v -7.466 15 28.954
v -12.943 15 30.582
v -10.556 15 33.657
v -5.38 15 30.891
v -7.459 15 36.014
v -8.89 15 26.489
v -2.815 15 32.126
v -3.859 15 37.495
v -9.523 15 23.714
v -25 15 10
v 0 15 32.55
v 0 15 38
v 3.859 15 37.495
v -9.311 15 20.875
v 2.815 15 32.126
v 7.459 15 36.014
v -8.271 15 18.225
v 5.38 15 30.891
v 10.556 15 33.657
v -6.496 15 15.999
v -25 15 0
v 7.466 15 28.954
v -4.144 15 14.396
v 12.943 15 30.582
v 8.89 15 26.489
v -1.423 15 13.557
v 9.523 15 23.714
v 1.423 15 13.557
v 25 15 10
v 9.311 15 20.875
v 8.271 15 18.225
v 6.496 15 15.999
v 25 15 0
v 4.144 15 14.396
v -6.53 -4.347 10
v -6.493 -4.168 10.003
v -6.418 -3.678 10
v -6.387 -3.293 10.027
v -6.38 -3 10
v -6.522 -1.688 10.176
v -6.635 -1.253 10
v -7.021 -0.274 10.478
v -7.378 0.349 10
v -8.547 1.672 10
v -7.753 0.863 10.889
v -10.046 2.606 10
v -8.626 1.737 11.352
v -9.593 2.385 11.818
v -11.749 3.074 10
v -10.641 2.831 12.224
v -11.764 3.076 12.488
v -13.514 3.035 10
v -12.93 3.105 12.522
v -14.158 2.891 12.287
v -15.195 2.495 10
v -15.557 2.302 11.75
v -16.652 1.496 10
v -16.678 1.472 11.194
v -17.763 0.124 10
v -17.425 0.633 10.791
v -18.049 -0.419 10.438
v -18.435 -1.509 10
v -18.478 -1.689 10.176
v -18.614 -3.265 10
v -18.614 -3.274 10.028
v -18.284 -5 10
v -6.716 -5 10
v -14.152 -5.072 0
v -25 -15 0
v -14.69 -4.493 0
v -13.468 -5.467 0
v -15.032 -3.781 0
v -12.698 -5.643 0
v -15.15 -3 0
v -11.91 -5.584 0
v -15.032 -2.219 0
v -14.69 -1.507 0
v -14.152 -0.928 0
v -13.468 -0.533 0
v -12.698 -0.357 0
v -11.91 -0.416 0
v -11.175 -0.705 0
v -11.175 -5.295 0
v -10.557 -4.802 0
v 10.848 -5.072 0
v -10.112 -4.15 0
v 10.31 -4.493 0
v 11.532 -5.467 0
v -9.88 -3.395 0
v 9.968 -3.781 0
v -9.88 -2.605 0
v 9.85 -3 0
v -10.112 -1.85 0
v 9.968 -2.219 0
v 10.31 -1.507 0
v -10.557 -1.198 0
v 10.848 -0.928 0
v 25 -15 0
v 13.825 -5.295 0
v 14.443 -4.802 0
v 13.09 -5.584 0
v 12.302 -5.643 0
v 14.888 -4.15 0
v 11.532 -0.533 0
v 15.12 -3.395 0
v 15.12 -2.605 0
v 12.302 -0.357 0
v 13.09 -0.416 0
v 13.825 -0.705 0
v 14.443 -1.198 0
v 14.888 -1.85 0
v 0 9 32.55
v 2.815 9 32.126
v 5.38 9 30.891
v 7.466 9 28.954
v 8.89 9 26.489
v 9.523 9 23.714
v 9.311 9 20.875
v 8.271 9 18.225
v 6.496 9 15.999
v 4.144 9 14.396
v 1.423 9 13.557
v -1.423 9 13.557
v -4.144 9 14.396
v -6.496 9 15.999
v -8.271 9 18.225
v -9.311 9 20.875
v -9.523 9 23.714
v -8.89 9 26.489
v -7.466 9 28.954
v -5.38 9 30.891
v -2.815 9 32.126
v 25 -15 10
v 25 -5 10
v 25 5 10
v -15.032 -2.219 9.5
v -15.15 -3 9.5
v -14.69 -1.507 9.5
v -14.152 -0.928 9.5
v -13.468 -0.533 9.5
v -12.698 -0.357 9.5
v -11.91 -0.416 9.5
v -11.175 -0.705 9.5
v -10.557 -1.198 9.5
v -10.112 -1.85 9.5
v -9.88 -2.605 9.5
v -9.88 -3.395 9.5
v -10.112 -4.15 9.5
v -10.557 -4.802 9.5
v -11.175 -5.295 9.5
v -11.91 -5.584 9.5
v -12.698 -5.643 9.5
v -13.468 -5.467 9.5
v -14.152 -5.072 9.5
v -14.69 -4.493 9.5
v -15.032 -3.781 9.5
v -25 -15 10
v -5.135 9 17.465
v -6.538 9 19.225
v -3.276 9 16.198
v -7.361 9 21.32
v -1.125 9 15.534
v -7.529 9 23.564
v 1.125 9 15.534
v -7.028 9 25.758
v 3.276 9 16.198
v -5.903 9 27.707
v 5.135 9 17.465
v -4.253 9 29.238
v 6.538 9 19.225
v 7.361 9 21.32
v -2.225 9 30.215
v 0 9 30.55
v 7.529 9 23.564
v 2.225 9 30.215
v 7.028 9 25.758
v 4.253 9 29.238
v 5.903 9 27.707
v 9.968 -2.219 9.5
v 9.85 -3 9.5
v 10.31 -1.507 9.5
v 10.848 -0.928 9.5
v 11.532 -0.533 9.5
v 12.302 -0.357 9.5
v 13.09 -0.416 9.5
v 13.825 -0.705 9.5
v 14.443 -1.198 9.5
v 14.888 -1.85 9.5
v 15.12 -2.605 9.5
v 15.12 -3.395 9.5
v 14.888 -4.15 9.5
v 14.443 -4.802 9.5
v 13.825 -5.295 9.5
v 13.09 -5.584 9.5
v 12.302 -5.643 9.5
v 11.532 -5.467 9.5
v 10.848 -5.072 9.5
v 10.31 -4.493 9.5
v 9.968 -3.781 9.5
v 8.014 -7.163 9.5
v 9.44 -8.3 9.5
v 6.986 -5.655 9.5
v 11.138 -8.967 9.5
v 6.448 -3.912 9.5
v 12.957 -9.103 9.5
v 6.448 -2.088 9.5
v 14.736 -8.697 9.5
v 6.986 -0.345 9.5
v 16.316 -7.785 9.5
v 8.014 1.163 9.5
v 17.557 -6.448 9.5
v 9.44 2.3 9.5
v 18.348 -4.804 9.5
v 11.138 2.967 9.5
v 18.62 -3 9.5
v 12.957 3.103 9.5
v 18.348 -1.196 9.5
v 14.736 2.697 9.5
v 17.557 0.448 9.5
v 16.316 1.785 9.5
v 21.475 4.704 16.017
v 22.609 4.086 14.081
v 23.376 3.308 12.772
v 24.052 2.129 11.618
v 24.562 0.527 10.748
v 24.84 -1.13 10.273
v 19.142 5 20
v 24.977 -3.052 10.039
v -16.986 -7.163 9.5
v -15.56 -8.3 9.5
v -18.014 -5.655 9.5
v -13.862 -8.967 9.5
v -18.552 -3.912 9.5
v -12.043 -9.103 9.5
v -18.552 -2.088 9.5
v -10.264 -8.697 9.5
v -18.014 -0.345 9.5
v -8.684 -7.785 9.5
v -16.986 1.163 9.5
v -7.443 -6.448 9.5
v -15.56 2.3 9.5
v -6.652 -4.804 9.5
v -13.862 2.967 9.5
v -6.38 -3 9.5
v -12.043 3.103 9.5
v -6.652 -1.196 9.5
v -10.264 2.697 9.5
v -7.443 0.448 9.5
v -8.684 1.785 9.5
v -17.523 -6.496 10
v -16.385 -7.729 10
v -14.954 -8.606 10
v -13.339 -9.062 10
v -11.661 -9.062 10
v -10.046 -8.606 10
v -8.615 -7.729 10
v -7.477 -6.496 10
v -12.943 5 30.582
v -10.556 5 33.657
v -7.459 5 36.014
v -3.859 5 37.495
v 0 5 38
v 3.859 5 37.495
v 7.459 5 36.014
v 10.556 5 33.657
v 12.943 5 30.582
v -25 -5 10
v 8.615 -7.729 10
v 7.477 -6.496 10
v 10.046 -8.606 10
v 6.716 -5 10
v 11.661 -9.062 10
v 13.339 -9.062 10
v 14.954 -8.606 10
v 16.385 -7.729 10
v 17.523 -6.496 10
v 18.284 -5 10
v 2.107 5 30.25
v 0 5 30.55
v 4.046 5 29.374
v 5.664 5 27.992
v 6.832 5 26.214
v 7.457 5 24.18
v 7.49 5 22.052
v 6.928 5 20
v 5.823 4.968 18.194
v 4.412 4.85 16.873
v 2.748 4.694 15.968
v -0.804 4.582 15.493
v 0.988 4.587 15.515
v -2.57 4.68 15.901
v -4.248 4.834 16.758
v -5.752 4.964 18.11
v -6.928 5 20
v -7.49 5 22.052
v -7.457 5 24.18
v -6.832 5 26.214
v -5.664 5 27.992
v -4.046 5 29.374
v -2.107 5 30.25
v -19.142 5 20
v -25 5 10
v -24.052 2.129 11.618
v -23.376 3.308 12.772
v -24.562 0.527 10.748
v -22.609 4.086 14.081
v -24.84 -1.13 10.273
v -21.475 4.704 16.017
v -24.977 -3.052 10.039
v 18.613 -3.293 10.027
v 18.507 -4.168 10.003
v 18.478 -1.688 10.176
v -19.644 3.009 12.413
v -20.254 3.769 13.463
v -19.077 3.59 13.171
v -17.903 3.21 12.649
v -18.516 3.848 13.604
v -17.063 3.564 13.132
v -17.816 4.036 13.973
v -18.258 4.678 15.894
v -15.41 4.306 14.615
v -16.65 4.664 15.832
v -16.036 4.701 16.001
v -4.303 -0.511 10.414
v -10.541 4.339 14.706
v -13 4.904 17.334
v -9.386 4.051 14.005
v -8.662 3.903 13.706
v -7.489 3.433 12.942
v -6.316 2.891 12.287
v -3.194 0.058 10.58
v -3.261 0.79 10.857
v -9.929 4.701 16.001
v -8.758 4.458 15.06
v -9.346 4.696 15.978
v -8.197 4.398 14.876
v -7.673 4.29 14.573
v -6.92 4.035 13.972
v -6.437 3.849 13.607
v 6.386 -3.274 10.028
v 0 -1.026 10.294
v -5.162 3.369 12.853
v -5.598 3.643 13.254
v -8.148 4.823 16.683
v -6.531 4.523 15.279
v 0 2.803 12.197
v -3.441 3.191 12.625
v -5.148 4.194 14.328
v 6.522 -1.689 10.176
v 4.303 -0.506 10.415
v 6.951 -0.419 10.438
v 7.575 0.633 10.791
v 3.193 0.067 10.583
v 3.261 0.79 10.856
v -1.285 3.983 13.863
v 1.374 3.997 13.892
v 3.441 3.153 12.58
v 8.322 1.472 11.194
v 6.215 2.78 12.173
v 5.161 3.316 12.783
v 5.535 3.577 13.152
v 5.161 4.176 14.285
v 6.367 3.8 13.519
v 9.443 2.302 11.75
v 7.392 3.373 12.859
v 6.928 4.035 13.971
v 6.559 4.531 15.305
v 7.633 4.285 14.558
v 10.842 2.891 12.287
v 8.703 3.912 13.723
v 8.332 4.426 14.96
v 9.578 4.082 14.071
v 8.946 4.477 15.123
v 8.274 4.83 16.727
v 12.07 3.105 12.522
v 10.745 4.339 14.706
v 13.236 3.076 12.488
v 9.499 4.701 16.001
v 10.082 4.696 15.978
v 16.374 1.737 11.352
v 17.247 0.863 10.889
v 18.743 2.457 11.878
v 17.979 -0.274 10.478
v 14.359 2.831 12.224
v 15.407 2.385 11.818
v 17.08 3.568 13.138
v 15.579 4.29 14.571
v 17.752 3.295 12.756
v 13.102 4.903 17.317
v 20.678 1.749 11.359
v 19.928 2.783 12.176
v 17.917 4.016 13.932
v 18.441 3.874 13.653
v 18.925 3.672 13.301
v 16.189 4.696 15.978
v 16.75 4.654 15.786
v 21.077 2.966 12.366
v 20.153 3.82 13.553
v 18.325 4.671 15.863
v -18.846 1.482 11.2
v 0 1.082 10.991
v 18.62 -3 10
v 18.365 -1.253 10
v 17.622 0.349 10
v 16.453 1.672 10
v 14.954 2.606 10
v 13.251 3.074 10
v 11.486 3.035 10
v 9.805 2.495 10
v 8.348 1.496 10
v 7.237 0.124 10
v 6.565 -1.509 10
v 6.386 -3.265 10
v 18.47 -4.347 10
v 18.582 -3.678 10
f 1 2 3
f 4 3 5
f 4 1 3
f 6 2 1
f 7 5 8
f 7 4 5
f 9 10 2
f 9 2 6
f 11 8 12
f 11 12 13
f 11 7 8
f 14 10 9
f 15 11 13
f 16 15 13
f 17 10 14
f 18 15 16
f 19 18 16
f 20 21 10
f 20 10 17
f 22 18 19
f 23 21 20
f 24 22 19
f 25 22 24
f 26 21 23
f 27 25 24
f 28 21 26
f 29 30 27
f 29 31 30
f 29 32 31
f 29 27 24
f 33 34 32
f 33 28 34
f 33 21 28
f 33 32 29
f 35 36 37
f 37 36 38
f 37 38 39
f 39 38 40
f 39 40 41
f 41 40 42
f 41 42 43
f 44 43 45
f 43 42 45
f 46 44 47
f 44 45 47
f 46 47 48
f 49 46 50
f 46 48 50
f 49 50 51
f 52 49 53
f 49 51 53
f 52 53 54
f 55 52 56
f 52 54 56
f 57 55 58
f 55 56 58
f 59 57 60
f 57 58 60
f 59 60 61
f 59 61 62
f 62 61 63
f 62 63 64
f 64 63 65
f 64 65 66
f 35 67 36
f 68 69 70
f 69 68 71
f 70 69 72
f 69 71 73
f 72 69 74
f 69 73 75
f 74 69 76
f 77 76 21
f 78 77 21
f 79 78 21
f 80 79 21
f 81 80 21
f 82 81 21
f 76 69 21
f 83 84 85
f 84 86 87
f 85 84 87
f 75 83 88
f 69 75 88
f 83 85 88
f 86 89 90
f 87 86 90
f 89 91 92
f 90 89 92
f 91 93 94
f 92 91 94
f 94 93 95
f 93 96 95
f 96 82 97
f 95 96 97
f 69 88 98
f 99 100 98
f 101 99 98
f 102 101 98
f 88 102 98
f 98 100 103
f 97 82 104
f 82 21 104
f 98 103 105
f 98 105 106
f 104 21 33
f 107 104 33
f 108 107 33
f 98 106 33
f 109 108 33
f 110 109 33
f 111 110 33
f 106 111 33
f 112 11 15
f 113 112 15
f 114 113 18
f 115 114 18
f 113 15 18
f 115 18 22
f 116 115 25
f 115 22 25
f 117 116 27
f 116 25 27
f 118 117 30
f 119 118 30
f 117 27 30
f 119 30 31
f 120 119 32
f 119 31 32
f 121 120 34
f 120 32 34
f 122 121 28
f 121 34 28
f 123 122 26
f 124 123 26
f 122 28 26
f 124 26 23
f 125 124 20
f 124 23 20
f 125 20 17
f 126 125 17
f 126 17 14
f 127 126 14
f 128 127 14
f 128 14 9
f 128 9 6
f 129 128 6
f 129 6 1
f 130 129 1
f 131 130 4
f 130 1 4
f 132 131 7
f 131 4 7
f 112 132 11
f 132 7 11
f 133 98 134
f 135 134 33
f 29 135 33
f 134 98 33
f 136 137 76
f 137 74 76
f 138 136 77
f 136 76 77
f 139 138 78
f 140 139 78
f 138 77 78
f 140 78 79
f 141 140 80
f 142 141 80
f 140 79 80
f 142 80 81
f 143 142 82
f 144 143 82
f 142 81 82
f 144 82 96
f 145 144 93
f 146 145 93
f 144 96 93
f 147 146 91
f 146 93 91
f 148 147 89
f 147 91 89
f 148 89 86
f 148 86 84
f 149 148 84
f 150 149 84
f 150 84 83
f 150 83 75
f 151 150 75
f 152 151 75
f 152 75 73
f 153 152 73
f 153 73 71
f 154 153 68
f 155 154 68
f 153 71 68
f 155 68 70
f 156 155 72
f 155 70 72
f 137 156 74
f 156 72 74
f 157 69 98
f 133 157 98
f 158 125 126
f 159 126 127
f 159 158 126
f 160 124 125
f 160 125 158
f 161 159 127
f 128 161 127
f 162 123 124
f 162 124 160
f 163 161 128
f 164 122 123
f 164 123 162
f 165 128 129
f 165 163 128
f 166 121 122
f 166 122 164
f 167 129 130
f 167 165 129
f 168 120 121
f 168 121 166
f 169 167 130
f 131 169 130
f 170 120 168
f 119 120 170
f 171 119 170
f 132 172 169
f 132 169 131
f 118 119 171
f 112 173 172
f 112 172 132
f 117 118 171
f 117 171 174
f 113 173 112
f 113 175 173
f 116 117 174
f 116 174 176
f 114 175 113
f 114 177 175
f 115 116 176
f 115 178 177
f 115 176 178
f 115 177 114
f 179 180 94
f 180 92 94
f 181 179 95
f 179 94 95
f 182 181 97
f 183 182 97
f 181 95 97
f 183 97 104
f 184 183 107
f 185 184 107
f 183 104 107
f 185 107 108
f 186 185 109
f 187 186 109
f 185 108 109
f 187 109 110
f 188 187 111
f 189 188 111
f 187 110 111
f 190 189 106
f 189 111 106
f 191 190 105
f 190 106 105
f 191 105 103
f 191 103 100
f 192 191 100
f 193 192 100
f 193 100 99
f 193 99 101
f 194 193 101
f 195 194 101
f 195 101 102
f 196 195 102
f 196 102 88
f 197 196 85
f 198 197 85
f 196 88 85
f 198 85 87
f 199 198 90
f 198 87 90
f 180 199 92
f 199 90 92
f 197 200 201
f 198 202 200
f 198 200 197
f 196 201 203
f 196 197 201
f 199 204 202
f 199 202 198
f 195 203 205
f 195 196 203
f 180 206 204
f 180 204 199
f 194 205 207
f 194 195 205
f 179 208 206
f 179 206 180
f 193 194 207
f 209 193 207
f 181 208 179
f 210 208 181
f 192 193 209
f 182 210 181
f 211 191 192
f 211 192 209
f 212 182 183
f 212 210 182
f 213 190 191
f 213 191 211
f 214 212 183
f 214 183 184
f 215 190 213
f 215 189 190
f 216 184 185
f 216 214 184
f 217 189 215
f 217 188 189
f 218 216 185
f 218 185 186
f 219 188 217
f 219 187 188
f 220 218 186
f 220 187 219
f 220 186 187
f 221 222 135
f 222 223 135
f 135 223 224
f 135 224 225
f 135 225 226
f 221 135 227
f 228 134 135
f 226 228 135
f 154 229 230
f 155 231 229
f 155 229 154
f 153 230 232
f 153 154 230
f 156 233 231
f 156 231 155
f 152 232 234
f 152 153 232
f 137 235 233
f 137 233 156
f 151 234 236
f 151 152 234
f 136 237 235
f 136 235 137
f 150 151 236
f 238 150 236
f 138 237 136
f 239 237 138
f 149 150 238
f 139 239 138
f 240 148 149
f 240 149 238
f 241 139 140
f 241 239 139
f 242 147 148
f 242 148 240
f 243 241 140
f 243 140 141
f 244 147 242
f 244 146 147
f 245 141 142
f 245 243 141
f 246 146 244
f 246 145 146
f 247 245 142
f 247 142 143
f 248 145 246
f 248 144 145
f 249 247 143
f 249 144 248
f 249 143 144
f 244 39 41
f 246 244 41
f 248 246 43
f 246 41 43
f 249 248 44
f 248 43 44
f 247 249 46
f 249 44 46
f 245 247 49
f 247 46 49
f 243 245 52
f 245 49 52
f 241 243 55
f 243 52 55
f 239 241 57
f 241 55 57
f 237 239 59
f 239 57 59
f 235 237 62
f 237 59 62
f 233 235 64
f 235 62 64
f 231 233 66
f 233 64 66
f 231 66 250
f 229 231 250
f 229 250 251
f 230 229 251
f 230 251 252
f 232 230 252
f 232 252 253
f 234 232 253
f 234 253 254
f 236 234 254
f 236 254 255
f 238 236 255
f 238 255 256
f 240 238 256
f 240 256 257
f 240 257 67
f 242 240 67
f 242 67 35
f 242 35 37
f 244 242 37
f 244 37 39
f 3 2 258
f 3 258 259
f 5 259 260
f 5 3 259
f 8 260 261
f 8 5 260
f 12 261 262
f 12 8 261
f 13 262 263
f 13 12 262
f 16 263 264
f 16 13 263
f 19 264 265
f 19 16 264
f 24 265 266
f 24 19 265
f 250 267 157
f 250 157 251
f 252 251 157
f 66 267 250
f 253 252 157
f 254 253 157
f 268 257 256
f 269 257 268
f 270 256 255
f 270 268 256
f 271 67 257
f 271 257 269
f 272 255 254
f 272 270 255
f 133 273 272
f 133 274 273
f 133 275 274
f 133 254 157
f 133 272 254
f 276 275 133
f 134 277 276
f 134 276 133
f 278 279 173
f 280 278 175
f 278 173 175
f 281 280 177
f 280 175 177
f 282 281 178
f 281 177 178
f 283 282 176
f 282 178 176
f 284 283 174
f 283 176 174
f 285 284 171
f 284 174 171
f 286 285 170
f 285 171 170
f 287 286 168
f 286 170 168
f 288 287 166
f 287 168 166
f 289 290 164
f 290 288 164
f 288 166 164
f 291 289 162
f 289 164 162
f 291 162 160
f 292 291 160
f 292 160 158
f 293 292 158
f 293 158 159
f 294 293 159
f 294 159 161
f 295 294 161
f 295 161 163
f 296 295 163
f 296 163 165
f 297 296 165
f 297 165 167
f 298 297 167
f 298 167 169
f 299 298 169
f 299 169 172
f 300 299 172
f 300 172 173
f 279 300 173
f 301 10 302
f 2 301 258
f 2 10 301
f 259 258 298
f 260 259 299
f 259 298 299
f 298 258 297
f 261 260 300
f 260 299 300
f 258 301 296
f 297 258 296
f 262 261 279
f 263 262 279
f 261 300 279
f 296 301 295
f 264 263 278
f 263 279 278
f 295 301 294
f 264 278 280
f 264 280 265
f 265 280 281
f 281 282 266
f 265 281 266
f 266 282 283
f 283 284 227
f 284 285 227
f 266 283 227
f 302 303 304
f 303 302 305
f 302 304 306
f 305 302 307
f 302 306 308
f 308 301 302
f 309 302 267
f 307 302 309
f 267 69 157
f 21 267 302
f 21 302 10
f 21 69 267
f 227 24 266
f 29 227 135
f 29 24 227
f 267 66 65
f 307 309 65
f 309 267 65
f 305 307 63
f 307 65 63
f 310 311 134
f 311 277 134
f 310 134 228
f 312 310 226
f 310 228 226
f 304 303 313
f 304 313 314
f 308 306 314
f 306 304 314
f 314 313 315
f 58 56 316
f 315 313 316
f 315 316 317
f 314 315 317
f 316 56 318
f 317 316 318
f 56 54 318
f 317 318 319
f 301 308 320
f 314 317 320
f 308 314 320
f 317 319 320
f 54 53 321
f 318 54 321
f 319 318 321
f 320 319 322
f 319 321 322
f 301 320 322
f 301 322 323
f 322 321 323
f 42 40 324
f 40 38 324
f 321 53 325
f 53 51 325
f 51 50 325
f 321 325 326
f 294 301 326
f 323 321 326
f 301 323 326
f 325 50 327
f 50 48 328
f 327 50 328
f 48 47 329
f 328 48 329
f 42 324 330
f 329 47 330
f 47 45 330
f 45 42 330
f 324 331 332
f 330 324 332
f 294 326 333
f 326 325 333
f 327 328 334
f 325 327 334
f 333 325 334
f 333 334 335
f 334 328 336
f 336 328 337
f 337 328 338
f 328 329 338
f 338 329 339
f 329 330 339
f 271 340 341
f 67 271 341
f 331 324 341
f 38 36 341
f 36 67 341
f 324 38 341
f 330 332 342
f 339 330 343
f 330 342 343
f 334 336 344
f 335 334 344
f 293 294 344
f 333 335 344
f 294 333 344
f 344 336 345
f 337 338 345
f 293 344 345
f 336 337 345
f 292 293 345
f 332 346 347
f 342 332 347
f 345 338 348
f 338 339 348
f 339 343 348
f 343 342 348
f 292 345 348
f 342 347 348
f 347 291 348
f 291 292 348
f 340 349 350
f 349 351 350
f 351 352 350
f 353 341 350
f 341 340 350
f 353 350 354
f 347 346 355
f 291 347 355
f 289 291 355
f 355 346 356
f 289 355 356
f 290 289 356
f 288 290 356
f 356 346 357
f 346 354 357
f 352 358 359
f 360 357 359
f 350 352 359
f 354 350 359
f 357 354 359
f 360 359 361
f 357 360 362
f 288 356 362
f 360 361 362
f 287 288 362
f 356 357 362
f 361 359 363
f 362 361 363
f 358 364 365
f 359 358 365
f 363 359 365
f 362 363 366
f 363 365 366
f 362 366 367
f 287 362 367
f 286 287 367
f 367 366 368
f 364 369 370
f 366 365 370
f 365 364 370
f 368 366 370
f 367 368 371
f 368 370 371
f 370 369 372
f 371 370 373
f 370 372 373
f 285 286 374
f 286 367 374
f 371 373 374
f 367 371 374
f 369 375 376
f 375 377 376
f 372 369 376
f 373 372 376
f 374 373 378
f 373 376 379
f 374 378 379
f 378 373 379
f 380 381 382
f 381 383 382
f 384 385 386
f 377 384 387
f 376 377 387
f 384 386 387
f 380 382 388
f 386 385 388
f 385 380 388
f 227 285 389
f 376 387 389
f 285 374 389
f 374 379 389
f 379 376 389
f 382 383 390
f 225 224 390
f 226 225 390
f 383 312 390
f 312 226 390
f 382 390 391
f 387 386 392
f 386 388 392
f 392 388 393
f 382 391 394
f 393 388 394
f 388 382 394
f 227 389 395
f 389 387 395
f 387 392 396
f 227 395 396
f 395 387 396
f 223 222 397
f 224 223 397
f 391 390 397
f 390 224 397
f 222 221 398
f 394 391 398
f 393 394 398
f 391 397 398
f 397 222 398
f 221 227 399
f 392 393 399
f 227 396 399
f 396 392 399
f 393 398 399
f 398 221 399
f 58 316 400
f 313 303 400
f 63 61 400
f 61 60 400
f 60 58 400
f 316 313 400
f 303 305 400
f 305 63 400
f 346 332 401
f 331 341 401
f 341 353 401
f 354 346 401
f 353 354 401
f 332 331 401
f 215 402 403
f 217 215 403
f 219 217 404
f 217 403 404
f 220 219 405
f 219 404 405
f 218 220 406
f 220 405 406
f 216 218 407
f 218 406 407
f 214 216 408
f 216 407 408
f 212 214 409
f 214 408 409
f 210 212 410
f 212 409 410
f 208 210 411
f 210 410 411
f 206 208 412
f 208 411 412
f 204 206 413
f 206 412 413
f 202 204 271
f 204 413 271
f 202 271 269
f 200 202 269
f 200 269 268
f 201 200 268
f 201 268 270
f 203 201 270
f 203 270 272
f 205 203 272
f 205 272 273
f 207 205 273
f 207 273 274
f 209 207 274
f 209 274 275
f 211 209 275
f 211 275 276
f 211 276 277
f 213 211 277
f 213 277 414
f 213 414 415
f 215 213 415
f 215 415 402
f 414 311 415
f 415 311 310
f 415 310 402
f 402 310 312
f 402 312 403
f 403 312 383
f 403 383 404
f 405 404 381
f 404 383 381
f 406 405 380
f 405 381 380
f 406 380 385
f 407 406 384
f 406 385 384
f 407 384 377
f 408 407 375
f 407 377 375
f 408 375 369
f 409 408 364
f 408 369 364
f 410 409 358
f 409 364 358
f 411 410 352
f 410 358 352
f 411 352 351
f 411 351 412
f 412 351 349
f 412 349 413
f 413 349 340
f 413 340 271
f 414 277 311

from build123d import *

# Parameters (mm, degrees)
SKETCH1_W                               = 50
SKETCH1_H                               = 30
BOSS_EXTRUDE1_DEPTH                     = 10
BOSS_EXTRUDE3_DEPTH                     = 10
CBORE_FOR_M5_HEX_HEAD_BOLT1_D           = 5.3
CBORE_FOR_M5_HEX_HEAD_BOLT1_CBORE_D     = 12.24
CBORE_FOR_M5_HEX_HEAD_BOLT1_CBORE_DEPTH = 0.5
FILLET1_SIZE                            = 10
SKETCH15_R                              = 9.55
CUT_EXTRUDE1_DEPTH                      = 6
SKETCH16_R                              = 7.55
CUT_EXTRUDE2_DEPTH                      = 52.429563531


with BuildPart() as part:
    # Sketch1 → Boss-Extrude1 (new body)
    with BuildSketch(Plane.XY):
        Rectangle(SKETCH1_W, SKETCH1_H)
    extrude(amount=BOSS_EXTRUDE1_DEPTH)

    # Sketch8 → Boss-Extrude3 (add)
    with BuildSketch(Plane(origin=(0, 15, 0), x_dir=(1, 0, 0), z_dir=(0, 1, 0))):
        with BuildLine():
            Line((-25, -10), (-12.942664449, -30.582047017))
            ThreePointArc((-12.942664449, -30.582047017), (0, -38), (12.942664449, -30.582047017))
            Line((12.942664449, -30.582047017), (25, -10))
            Line((25, -10), (-25, -10))
        make_face()
    extrude(amount=-BOSS_EXTRUDE3_DEPTH)

    # CBORE for M5 Hex Head Bolt1 (through all)
    with Locations(Plane.XY.offset(10)):
        with Locations((12.5, -3), (-12.5, -3)):
            CounterBoreHole(CBORE_FOR_M5_HEX_HEAD_BOLT1_D / 2, CBORE_FOR_M5_HEX_HEAD_BOLT1_CBORE_D / 2, CBORE_FOR_M5_HEX_HEAD_BOLT1_CBORE_DEPTH)

    # Fillet1
    # a fillet whose section is not a circle: 10 mm, written as the material it adds along each edge
    with BuildSketch(Plane(origin=(50, 5, 10), x_dir=(0, -1, 0), z_dir=(-1, 0, 0))) as fillet1_piece_1_section:
        with BuildLine():
            add(Edge.make_bspline([(FILLET1_SIZE, 0), (FILLET1_SIZE * 0.831801948466, 0), (FILLET1_SIZE * 0.663603896932, 0), (FILLET1_SIZE * 0.292893218813, FILLET1_SIZE * 0.0716919198361), (FILLET1_SIZE * 0.0716919198361, FILLET1_SIZE * 0.292893218813), (0, FILLET1_SIZE * 0.663603896932), (0, FILLET1_SIZE * 0.831801948466), (0, FILLET1_SIZE)], knots=[0, 0, 0, 0, 0, 0, 0.5, 0.5, 1, 1, 1, 1, 1, 1], degree=5))
            Line((0, FILLET1_SIZE), (0, 0))
            Line((0, 0), (FILLET1_SIZE, 0))
        make_face()
    fillet1_piece_1 = extrude(amount=100, mode=Mode.PRIVATE)
    fillet1_piece_1 = split(fillet1_piece_1, bisect_by=Plane(origin=(-5.837521011, 5, 42.710630125), z_dir=(0.8628442965853785, 0, -0.5054698011257285)), keep=Keep.TOP, mode=Mode.PRIVATE)
    fillet1_piece_1 = split(fillet1_piece_1, bisect_by=Plane(origin=(31.387492996, 5, -0.903543375), z_dir=(-0.8628442965853789, 0, -0.5054698011257279)), keep=Keep.TOP, mode=Mode.PRIVATE)
    fillet1_piece_1 = fillet1_piece_1 - Plane(origin=(12.5, -3, 10), x_dir=(1, 0, 0), z_dir=(0, 0, 1)) * Cylinder(6.12, 240, mode=Mode.PRIVATE)
    fillet1_piece_1 = fillet1_piece_1 - Plane(origin=(-12.5, -3, 10), x_dir=(1, 0, 0), z_dir=(0, 0, 1)) * Cylinder(6.12, 240, mode=Mode.PRIVATE)
    add(fillet1_piece_1)

    # Sketch15 → Cut-Extrude1 (cut)
    with BuildSketch(Plane(origin=(0, 15, 0), x_dir=(1, 0, 0), z_dir=(0, 1, 0))):
        with Locations(Location((0, -23, 0), (0, 0, 270))):
            Circle(SKETCH15_R)
    extrude(amount=-CUT_EXTRUDE1_DEPTH, mode=Mode.SUBTRACT)

    # Sketch16 → Cut-Extrude2 (cut, through all)
    with BuildSketch(Plane(origin=(0, 9, 0), x_dir=(1, 0, 0), z_dir=(0, 1, 0))):
        with Locations(Location((0, -23, 0), (0, 0, 270))):
            Circle(SKETCH16_R)
    extrude(amount=-CUT_EXTRUDE2_DEPTH, mode=Mode.SUBTRACT)


solid = part.part
